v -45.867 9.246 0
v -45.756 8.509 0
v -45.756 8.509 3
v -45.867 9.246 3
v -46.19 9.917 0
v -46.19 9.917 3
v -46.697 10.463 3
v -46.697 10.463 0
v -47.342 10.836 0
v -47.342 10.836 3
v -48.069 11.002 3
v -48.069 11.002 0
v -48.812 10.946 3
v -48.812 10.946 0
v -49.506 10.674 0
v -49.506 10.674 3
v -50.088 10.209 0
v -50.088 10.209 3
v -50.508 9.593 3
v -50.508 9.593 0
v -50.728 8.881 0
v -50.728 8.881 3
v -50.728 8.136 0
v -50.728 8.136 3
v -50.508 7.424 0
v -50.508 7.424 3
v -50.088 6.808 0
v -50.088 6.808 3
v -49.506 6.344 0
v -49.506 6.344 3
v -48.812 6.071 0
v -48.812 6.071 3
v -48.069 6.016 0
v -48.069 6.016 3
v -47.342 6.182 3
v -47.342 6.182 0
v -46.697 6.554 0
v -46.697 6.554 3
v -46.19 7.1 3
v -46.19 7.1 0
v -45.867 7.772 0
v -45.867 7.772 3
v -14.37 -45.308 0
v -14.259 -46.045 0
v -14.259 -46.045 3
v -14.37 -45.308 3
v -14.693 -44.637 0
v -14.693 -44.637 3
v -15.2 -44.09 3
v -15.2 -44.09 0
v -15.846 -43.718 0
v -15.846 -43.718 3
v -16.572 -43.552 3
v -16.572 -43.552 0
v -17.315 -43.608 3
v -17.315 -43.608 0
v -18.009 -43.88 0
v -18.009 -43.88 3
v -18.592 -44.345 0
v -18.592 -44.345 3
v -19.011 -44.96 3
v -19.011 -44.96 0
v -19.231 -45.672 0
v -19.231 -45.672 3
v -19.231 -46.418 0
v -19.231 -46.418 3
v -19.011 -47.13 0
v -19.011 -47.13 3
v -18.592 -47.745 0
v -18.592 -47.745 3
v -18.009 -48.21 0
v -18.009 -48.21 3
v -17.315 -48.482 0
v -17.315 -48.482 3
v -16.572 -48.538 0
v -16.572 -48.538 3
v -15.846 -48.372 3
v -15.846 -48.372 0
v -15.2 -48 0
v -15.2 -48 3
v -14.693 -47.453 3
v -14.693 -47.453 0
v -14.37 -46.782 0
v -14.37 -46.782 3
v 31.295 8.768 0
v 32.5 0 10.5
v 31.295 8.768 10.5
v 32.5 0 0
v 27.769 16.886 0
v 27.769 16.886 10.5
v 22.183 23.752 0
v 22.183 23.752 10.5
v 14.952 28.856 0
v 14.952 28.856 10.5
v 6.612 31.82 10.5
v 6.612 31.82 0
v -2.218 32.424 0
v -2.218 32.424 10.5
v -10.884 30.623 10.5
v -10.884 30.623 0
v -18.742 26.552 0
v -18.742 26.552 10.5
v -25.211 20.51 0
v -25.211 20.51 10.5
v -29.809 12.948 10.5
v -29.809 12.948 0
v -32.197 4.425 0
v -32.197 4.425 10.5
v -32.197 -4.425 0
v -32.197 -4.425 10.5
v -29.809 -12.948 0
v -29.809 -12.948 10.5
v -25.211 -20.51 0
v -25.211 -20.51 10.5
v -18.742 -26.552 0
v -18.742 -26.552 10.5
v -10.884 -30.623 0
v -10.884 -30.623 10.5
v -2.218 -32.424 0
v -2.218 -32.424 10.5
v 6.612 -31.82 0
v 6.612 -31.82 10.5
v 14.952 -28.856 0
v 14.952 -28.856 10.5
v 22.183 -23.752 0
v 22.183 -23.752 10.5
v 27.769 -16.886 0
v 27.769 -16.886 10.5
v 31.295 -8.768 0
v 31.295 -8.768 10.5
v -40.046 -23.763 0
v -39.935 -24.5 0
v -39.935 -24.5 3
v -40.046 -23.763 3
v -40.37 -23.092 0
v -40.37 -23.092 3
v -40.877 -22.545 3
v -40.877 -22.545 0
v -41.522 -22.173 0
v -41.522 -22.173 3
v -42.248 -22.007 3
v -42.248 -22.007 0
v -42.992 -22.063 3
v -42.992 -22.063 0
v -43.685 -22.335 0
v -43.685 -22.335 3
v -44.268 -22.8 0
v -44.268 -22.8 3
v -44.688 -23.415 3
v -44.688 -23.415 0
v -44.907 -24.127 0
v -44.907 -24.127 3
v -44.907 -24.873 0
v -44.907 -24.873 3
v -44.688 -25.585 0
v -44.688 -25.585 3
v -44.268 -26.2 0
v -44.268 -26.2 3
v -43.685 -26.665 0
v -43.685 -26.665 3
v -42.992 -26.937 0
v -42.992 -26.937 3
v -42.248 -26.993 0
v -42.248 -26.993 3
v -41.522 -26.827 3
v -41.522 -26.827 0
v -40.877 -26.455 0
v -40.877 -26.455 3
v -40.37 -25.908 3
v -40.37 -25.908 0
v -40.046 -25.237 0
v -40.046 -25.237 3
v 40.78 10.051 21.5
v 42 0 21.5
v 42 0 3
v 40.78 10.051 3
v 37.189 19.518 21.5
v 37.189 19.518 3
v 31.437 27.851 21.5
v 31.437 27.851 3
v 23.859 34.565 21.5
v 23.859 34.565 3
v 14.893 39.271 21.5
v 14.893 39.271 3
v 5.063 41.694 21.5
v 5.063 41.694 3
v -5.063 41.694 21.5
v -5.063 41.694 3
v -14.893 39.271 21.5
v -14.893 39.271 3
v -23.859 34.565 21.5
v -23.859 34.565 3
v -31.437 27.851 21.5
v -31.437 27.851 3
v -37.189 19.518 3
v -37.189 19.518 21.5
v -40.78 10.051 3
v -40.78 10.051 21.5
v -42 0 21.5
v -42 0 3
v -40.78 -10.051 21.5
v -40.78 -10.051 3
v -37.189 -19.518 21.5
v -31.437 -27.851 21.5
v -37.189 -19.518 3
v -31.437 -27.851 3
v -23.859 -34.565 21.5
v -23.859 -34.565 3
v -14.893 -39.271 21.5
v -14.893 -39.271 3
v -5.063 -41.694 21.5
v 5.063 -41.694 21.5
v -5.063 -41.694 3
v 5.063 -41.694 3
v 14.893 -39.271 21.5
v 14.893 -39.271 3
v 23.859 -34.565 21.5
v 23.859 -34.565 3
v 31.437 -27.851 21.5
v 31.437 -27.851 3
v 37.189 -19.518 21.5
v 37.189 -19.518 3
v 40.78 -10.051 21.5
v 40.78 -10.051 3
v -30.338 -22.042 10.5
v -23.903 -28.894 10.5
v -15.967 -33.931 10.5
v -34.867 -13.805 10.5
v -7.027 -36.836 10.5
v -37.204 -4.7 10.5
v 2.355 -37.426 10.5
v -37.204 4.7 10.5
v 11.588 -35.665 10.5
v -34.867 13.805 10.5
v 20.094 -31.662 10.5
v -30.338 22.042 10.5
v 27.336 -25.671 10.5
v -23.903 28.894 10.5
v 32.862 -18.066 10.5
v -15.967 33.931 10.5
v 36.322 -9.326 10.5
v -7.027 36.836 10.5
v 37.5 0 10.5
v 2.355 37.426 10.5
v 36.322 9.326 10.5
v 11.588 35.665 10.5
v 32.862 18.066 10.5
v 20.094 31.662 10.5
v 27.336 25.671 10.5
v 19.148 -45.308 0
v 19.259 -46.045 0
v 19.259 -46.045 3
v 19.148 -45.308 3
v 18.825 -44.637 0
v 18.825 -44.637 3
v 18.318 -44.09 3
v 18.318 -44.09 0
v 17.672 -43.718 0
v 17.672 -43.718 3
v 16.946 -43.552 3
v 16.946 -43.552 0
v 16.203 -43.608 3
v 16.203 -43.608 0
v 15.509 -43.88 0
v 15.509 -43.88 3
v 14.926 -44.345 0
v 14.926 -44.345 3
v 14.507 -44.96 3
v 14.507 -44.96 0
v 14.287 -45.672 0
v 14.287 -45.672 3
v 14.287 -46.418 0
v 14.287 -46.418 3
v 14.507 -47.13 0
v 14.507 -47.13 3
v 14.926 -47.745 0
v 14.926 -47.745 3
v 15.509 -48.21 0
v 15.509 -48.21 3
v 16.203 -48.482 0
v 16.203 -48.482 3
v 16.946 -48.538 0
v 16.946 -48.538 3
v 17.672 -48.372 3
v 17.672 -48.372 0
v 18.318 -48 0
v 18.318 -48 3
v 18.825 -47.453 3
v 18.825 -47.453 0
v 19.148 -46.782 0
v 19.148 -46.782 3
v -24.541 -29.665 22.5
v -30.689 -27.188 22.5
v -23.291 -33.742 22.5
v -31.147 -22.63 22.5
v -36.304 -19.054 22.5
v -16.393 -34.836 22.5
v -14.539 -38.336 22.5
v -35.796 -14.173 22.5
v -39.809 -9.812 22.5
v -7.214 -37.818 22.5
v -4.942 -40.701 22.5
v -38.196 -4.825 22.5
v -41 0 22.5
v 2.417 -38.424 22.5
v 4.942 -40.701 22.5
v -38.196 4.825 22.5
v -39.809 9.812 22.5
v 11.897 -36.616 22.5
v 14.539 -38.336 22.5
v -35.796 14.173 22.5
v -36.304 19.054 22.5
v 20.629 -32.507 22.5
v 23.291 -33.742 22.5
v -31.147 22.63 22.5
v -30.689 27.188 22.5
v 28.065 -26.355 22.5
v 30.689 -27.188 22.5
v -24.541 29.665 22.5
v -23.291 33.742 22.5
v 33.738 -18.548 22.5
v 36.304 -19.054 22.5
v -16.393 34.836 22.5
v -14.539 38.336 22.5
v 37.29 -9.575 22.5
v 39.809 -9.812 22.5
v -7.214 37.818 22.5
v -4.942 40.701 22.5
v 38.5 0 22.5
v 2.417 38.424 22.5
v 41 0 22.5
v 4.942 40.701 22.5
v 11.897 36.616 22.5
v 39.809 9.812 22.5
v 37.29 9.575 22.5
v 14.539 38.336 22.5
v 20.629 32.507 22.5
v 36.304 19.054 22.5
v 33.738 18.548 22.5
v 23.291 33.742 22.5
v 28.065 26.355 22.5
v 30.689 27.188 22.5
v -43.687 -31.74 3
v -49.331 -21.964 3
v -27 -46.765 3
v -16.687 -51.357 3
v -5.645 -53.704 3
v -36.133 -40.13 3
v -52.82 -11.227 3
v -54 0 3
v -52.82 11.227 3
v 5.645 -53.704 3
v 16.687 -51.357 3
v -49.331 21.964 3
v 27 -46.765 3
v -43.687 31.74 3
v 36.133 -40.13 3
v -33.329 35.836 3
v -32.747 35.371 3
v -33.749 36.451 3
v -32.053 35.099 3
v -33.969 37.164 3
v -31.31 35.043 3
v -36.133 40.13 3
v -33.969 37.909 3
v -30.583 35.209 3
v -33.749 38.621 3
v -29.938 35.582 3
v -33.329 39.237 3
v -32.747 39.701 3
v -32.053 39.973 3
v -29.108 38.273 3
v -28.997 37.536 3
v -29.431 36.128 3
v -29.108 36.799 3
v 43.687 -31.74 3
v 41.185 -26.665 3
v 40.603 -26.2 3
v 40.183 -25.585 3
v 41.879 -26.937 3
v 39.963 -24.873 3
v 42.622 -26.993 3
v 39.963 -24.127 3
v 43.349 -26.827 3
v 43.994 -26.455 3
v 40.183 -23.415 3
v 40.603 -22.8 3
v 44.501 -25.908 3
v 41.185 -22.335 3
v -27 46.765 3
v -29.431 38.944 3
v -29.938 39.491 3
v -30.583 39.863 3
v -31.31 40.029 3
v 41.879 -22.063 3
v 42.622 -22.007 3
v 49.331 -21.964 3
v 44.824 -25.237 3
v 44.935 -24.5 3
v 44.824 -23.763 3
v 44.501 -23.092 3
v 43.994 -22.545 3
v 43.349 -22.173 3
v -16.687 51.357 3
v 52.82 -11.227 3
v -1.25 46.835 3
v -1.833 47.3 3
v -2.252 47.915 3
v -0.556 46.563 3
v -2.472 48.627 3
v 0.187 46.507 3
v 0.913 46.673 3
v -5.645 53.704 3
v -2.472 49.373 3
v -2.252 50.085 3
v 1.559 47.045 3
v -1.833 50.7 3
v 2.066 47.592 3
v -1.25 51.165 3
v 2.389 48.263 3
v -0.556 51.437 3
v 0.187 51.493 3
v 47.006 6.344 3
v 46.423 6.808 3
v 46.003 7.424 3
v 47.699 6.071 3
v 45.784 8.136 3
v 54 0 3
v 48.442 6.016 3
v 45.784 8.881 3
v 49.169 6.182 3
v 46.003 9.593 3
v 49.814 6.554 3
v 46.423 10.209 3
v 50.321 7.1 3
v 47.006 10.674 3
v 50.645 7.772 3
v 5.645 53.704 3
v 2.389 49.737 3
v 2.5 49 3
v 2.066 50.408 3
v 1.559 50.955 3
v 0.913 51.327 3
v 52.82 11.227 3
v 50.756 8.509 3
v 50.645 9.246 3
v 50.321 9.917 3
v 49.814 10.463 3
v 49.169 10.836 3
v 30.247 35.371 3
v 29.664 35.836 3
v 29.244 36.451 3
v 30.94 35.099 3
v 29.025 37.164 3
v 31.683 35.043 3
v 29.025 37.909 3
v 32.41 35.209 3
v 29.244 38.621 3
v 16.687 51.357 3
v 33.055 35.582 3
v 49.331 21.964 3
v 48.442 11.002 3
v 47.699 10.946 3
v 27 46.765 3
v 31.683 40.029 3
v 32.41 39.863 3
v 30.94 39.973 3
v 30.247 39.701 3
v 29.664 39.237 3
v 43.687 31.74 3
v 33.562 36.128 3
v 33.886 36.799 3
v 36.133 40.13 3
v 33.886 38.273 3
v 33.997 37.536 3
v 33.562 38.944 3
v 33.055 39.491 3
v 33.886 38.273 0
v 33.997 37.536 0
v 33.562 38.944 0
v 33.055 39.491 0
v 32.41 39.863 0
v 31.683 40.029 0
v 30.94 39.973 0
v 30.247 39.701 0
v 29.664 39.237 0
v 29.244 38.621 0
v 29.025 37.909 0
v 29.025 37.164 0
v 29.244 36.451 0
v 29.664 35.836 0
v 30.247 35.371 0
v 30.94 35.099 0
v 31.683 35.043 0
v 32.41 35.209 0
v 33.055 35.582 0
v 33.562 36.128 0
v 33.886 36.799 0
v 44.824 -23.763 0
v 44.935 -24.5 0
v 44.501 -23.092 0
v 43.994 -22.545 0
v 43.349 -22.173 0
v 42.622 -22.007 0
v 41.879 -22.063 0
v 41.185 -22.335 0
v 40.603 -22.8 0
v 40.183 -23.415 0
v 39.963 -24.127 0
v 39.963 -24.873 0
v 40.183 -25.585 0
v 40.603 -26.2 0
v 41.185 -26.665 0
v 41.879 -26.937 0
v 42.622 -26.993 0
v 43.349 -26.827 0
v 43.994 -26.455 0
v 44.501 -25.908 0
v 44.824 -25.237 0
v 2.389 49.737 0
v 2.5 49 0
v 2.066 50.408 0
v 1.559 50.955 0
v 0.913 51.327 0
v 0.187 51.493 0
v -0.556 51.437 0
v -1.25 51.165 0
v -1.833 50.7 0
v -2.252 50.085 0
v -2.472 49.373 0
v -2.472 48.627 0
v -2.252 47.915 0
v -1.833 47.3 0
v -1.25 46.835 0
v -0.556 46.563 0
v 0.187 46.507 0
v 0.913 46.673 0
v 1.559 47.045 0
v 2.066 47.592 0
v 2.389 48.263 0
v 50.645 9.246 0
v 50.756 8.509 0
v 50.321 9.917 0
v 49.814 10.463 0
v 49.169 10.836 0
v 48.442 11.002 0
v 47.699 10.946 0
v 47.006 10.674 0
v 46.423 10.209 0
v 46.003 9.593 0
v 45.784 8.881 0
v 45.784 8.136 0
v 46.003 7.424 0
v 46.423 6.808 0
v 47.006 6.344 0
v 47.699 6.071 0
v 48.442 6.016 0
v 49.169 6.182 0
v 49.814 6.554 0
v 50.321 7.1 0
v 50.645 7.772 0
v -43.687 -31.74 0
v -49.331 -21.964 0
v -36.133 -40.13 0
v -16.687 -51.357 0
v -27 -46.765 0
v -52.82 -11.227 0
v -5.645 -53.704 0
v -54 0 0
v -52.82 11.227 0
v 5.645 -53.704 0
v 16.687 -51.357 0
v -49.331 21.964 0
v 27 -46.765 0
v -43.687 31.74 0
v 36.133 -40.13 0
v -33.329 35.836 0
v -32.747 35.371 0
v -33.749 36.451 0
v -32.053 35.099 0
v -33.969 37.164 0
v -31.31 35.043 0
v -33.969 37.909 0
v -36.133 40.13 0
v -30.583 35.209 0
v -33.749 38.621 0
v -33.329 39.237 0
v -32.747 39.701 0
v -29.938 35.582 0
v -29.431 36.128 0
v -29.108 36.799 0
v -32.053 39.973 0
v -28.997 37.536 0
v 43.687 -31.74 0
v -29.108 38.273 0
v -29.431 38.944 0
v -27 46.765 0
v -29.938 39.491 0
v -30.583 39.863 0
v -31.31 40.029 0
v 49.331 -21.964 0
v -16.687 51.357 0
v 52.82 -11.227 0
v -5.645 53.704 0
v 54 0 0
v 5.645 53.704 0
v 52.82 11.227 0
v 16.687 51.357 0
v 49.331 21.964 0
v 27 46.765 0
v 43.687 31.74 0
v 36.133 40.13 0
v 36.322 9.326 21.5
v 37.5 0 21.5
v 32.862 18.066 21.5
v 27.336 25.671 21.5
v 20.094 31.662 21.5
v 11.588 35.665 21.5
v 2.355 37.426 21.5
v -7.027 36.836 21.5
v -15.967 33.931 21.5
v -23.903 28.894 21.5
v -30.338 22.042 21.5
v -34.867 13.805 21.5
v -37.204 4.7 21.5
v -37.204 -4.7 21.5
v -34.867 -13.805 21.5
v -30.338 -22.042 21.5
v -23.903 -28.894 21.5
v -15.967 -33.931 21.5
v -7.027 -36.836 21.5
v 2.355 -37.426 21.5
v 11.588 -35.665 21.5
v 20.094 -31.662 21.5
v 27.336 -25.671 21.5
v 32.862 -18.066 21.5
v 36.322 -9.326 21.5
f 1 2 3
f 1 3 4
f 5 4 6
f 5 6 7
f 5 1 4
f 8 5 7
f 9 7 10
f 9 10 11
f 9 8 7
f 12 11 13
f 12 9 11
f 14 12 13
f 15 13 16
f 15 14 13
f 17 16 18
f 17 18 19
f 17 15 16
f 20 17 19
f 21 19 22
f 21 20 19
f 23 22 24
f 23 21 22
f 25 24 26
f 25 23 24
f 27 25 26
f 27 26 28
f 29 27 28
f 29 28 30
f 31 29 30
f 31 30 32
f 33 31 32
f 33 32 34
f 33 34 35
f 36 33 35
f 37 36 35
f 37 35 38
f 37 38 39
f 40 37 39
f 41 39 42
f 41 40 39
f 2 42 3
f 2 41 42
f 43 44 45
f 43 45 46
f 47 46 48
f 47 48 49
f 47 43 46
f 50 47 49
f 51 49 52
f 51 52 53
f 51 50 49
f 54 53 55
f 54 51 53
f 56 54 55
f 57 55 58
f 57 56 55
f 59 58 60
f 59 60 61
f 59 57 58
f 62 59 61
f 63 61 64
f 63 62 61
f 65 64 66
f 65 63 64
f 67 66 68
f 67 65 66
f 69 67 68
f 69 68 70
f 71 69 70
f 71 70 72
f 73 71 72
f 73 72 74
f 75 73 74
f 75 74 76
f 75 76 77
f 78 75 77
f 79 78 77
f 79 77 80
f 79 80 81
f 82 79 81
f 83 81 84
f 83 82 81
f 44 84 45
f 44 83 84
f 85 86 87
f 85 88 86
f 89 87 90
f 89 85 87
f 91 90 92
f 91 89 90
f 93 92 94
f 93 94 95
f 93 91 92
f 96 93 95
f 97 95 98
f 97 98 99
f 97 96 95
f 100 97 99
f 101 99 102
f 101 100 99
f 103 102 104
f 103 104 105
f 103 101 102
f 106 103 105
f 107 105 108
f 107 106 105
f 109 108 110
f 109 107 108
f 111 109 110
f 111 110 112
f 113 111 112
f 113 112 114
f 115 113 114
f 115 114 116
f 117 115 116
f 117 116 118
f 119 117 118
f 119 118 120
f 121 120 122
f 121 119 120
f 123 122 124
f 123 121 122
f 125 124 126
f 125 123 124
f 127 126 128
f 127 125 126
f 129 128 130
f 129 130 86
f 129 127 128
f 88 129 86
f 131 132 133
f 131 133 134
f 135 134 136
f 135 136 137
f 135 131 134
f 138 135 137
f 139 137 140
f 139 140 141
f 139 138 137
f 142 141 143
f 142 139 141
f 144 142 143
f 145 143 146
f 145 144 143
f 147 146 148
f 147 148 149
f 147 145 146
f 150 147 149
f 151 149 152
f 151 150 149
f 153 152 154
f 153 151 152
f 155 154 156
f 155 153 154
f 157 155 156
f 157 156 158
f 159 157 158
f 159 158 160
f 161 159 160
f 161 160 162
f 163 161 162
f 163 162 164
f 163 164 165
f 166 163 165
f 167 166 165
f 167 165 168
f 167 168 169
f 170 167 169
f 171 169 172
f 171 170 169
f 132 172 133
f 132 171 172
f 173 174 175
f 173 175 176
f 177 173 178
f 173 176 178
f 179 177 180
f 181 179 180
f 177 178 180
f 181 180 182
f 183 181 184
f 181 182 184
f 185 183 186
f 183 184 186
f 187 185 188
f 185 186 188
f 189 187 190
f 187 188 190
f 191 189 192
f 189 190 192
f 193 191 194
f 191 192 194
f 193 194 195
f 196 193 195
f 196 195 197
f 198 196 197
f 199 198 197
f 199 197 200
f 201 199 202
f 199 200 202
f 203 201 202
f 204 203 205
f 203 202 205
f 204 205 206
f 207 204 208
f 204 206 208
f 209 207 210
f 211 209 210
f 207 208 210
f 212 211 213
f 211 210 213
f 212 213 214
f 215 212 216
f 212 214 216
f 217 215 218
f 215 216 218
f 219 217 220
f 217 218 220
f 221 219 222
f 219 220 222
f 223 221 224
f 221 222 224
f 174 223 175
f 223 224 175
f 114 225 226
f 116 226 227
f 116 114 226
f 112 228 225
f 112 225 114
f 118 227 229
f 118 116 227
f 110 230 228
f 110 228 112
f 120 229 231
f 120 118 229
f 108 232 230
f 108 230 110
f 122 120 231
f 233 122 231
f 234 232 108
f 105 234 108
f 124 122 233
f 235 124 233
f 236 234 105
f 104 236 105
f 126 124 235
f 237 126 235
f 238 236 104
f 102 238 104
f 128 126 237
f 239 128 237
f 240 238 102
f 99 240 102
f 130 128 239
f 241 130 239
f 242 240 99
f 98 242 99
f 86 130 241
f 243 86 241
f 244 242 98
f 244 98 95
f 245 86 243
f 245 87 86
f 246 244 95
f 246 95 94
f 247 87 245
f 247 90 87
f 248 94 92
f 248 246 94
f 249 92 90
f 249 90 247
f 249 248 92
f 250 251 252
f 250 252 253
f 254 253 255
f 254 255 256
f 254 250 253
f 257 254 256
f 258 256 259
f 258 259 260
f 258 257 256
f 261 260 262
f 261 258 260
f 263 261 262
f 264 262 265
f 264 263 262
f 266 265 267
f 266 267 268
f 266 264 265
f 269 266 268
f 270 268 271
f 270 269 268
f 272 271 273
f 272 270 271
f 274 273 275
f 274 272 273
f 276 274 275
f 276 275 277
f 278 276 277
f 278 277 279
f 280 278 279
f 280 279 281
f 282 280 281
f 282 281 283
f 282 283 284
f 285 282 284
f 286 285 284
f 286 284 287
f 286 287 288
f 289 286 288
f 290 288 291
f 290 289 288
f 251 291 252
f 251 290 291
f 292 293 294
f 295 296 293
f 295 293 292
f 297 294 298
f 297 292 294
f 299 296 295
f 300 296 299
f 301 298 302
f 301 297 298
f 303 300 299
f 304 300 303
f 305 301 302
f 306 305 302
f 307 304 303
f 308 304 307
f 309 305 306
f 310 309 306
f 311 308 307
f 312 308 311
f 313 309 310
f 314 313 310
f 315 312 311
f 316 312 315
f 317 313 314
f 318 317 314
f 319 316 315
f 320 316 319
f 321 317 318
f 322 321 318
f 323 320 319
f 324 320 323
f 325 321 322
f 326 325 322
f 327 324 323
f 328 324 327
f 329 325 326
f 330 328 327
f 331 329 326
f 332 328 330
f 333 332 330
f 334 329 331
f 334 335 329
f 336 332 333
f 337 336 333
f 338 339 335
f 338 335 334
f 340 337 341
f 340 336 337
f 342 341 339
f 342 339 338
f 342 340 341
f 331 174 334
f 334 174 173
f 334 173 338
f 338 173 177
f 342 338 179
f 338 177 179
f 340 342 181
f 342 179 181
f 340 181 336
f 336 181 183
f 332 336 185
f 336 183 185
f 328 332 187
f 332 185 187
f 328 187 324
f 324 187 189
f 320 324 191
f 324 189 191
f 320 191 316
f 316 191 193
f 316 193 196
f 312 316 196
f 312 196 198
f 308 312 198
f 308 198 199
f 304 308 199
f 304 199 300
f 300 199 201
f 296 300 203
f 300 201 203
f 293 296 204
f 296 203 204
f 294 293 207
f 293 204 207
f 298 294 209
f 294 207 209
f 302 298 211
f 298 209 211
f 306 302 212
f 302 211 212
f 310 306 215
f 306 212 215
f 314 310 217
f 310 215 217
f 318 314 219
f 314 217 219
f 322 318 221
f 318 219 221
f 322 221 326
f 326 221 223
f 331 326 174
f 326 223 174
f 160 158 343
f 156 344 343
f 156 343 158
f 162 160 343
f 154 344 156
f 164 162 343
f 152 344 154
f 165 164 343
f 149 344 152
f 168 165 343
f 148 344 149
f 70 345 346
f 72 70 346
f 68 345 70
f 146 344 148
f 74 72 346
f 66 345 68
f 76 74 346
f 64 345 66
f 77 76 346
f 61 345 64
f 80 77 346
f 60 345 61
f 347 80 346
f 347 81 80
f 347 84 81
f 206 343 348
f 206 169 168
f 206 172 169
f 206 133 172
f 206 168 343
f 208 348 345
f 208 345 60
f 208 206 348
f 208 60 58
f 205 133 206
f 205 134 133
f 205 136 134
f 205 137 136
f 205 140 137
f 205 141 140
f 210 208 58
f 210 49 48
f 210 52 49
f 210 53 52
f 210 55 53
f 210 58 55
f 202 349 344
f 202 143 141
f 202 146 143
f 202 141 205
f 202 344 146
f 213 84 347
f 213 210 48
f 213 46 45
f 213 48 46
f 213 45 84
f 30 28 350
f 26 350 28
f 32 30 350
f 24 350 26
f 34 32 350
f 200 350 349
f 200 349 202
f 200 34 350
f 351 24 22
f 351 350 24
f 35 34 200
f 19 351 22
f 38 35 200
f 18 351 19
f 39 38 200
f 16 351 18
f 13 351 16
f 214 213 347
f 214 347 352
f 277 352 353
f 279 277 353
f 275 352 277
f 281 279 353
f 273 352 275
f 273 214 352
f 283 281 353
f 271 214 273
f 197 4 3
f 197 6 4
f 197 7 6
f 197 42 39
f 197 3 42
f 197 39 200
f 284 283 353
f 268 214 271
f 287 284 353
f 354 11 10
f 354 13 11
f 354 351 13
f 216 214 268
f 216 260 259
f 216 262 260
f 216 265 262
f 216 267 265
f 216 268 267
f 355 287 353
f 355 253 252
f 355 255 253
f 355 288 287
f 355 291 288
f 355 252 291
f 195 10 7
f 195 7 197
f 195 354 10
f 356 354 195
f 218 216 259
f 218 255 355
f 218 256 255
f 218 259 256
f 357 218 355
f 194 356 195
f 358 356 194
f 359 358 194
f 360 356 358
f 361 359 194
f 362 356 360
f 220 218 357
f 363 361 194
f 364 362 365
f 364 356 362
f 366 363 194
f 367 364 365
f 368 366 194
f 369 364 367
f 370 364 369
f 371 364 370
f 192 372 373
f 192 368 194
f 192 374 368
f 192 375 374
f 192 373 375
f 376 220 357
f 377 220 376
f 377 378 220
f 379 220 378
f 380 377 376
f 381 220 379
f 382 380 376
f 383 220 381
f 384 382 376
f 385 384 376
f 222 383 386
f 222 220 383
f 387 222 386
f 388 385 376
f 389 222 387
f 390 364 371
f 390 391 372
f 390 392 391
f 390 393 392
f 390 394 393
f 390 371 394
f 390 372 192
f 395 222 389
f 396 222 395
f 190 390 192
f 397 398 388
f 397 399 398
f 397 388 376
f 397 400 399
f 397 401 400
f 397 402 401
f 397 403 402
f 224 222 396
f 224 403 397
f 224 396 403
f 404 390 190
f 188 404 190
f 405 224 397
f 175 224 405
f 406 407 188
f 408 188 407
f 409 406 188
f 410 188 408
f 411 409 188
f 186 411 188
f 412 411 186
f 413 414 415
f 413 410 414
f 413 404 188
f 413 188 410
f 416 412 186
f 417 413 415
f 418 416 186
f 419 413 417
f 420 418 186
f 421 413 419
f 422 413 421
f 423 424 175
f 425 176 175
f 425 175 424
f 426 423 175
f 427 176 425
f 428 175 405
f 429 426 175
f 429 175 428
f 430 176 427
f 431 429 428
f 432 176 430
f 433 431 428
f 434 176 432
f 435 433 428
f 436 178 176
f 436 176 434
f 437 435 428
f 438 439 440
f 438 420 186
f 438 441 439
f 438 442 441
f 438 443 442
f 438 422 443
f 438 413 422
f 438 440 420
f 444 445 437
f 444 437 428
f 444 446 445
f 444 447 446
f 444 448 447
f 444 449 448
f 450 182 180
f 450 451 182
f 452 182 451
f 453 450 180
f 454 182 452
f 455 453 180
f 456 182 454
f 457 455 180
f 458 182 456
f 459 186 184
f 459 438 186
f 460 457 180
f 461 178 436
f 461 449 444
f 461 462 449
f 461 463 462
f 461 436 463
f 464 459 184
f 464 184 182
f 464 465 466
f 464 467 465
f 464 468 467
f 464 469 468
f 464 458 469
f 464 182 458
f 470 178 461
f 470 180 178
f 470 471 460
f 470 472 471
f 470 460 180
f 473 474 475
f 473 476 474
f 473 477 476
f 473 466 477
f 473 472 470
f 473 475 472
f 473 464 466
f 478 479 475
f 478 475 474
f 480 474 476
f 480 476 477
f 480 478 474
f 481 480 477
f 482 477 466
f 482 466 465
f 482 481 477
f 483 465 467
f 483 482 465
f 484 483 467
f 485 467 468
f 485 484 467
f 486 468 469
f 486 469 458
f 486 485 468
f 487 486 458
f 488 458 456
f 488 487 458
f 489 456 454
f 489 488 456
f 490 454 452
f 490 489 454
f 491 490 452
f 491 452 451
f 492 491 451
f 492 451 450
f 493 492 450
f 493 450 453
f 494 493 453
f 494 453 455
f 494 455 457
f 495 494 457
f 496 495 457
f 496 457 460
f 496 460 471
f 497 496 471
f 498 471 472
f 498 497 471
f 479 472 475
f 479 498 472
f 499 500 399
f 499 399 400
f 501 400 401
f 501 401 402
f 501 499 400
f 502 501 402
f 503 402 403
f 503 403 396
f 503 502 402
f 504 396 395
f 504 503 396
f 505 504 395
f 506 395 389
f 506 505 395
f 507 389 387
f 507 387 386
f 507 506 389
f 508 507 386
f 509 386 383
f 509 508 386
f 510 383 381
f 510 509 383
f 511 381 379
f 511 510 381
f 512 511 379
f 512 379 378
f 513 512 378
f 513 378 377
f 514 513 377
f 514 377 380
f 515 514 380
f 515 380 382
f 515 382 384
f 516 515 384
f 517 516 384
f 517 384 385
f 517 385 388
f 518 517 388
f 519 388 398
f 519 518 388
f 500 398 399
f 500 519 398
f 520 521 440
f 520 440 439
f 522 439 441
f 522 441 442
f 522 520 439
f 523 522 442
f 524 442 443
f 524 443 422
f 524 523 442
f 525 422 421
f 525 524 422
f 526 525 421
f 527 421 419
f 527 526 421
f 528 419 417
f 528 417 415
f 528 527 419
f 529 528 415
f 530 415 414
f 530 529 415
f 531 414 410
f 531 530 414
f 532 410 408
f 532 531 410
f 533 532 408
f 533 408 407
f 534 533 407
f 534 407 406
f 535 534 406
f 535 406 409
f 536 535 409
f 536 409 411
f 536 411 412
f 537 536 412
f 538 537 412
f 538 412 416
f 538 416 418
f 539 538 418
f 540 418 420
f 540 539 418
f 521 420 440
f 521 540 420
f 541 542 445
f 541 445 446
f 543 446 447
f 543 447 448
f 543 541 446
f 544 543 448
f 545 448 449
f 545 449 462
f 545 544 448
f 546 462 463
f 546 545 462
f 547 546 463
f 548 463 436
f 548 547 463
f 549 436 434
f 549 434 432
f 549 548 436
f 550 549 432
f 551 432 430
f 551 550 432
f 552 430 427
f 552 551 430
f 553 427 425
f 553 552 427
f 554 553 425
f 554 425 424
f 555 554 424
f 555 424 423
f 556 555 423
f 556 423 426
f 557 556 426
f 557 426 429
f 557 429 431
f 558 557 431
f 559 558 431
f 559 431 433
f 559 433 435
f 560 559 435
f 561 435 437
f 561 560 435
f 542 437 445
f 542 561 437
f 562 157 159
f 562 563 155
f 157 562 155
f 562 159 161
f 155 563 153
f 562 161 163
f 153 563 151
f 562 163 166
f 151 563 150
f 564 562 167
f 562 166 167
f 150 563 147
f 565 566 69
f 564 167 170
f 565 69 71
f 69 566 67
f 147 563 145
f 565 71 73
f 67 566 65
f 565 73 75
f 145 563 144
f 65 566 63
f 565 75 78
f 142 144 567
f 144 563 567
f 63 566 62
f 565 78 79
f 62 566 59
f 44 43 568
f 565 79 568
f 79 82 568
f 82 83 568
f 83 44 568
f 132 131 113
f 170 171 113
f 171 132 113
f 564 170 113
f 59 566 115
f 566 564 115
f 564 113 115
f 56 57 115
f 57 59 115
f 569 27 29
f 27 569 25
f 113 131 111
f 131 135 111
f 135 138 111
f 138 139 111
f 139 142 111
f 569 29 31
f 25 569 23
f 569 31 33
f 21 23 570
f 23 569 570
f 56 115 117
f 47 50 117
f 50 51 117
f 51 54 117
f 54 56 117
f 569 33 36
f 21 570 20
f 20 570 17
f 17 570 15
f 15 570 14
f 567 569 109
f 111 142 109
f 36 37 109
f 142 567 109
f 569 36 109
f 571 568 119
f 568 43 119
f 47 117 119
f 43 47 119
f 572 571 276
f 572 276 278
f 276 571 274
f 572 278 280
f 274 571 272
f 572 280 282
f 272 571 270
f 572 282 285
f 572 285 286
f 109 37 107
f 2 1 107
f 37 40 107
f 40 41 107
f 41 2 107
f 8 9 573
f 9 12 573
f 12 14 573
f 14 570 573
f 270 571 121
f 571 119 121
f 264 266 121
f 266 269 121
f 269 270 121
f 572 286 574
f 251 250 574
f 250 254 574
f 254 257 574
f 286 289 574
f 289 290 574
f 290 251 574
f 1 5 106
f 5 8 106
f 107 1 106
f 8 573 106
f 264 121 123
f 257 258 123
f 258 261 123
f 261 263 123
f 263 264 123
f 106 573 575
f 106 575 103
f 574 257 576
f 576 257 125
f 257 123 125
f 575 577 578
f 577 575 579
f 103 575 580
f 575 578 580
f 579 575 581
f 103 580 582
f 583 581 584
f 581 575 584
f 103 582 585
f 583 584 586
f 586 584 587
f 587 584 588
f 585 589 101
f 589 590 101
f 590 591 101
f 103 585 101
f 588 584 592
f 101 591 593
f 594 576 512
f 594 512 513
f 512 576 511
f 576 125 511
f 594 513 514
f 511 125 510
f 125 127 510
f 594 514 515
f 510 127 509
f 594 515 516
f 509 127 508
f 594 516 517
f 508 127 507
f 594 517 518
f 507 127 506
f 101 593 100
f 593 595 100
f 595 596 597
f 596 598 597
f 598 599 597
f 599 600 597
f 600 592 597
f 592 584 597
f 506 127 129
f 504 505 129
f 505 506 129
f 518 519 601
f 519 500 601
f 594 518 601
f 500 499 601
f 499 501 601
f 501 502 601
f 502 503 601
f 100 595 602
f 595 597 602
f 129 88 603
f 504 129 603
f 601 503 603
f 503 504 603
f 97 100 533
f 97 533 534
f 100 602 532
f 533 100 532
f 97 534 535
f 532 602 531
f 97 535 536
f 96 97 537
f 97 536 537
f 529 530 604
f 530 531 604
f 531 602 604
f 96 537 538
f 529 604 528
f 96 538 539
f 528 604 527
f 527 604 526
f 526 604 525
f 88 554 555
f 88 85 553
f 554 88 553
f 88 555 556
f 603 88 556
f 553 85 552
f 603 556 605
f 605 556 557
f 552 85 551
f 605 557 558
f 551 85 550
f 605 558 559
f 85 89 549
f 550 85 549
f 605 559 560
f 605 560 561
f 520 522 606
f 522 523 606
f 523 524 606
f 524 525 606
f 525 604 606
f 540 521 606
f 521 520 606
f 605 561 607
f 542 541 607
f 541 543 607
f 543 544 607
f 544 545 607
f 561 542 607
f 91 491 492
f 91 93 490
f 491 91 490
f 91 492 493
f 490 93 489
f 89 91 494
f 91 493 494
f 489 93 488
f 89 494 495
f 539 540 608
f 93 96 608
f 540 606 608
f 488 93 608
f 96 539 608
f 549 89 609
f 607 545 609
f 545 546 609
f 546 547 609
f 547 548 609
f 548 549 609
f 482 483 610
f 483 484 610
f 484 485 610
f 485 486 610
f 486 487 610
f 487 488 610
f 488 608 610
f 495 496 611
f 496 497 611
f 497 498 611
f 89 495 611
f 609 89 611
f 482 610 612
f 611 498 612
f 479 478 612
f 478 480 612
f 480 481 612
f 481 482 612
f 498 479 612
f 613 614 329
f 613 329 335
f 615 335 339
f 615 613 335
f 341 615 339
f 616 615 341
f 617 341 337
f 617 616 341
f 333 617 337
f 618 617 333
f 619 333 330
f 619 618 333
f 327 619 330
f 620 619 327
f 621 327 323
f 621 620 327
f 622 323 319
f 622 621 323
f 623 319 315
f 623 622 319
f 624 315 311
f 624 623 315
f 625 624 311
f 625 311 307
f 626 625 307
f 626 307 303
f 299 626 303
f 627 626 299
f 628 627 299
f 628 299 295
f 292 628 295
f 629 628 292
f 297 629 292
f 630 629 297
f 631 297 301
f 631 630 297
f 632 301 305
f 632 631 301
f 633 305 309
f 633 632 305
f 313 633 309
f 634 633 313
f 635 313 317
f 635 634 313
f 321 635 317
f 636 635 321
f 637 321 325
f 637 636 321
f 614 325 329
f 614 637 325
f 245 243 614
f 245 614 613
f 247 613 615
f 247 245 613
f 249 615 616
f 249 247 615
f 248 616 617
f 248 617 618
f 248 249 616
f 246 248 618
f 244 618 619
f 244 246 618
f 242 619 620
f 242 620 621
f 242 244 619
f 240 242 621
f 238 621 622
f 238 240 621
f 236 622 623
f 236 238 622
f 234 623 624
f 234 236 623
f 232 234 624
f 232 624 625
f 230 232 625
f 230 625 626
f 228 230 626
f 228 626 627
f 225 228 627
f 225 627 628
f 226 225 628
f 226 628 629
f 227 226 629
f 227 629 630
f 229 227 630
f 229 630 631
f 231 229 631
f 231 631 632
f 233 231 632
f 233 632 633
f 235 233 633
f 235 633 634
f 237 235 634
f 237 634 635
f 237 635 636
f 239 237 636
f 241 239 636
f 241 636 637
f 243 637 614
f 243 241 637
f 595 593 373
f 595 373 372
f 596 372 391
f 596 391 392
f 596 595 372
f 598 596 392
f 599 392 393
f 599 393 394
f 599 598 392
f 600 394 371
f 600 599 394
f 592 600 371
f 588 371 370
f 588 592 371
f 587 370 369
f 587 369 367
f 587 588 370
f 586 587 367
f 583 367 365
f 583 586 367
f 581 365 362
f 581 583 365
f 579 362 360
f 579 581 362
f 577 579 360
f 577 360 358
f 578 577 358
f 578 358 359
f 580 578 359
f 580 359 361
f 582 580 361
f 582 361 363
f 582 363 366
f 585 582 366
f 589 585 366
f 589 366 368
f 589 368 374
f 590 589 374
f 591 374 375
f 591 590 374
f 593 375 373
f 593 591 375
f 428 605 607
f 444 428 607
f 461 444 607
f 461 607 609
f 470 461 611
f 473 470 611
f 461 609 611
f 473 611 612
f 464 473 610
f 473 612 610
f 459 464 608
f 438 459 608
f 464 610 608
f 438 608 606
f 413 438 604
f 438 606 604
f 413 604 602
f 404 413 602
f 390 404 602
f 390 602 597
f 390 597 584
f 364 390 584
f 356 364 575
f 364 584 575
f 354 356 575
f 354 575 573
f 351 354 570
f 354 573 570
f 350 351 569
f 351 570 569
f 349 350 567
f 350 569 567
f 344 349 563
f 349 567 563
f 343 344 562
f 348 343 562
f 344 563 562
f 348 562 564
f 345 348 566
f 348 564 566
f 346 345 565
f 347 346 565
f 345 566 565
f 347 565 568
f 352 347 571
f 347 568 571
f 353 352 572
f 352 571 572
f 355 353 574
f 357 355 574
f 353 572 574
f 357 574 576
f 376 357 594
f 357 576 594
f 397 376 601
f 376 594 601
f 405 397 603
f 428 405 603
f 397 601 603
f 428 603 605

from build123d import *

# Parameters (mm, degrees)
SKETCH_R        = 54
SKETCH_R_2      = 32.5
SKETCH_R_3      = 2.5
PAD_DEPTH       = 3
SKETCH002_R     = 42
SKETCH002_R_2   = 37.5
PAD002_DEPTH    = 19.5
SKETCH003_R     = 37.5
SKETCH003_R_2   = 32.5
PAD003_DEPTH    = 7.5
CHAMFER_SIZE    = 1
CHAMFER001_SIZE = 1


with BuildPart() as part:
    # Sketch → Pad (new body)
    with BuildSketch(Plane.XY):
        Circle(SKETCH_R)
        Circle(SKETCH_R_2, mode=Mode.SUBTRACT)
        with Locations((0, 49)):
            Circle(SKETCH_R_3, mode=Mode.SUBTRACT)
        with Locations((48.25558, 8.508761)):
            Circle(SKETCH_R_3, mode=Mode.SUBTRACT)
        with Locations((42.435245, -24.5)):
            Circle(SKETCH_R_3, mode=Mode.SUBTRACT)
        with Locations((16.758987, -46.044938)):
            Circle(SKETCH_R_3, mode=Mode.SUBTRACT)
        with Locations((-16.758987, -46.044938)):
            Circle(SKETCH_R_3, mode=Mode.SUBTRACT)
        with Locations((-42.435245, -24.5)):
            Circle(SKETCH_R_3, mode=Mode.SUBTRACT)
        with Locations((-48.25558, 8.508761)):
            Circle(SKETCH_R_3, mode=Mode.SUBTRACT)
        with Locations((-31.496593, 37.536178)):
            Circle(SKETCH_R_3, mode=Mode.SUBTRACT)
        with Locations((31.496593, 37.536178)):
            Circle(SKETCH_R_3, mode=Mode.SUBTRACT)
    extrude(amount=PAD_DEPTH)

    # Sketch002 → Pad002 (join)
    with BuildSketch(Plane.XY.offset(3)):
        Circle(SKETCH002_R)
        Circle(SKETCH002_R_2, mode=Mode.SUBTRACT)
    extrude(amount=PAD002_DEPTH)

    # Sketch003 (on Face15 of Pad002) → Pad003 (join)
    with BuildSketch(Plane.XY.offset(3)):
        Circle(SKETCH003_R)
        Circle(SKETCH003_R_2, mode=Mode.SUBTRACT)
    extrude(amount=PAD003_DEPTH)

    # Chamfer
    chamfer_edges = [part.edges().sort_by_distance(p)[0] for p in [
        (-37.5, 0, 22.5),
    ]]
    chamfer(chamfer_edges, length=CHAMFER_SIZE)

    # Chamfer001
    chamfer001_edges = [part.edges().sort_by_distance(p)[0] for p in [
        (-42, 0, 22.5),
    ]]
    chamfer(chamfer001_edges, length=CHAMFER001_SIZE)


solid = part.part
